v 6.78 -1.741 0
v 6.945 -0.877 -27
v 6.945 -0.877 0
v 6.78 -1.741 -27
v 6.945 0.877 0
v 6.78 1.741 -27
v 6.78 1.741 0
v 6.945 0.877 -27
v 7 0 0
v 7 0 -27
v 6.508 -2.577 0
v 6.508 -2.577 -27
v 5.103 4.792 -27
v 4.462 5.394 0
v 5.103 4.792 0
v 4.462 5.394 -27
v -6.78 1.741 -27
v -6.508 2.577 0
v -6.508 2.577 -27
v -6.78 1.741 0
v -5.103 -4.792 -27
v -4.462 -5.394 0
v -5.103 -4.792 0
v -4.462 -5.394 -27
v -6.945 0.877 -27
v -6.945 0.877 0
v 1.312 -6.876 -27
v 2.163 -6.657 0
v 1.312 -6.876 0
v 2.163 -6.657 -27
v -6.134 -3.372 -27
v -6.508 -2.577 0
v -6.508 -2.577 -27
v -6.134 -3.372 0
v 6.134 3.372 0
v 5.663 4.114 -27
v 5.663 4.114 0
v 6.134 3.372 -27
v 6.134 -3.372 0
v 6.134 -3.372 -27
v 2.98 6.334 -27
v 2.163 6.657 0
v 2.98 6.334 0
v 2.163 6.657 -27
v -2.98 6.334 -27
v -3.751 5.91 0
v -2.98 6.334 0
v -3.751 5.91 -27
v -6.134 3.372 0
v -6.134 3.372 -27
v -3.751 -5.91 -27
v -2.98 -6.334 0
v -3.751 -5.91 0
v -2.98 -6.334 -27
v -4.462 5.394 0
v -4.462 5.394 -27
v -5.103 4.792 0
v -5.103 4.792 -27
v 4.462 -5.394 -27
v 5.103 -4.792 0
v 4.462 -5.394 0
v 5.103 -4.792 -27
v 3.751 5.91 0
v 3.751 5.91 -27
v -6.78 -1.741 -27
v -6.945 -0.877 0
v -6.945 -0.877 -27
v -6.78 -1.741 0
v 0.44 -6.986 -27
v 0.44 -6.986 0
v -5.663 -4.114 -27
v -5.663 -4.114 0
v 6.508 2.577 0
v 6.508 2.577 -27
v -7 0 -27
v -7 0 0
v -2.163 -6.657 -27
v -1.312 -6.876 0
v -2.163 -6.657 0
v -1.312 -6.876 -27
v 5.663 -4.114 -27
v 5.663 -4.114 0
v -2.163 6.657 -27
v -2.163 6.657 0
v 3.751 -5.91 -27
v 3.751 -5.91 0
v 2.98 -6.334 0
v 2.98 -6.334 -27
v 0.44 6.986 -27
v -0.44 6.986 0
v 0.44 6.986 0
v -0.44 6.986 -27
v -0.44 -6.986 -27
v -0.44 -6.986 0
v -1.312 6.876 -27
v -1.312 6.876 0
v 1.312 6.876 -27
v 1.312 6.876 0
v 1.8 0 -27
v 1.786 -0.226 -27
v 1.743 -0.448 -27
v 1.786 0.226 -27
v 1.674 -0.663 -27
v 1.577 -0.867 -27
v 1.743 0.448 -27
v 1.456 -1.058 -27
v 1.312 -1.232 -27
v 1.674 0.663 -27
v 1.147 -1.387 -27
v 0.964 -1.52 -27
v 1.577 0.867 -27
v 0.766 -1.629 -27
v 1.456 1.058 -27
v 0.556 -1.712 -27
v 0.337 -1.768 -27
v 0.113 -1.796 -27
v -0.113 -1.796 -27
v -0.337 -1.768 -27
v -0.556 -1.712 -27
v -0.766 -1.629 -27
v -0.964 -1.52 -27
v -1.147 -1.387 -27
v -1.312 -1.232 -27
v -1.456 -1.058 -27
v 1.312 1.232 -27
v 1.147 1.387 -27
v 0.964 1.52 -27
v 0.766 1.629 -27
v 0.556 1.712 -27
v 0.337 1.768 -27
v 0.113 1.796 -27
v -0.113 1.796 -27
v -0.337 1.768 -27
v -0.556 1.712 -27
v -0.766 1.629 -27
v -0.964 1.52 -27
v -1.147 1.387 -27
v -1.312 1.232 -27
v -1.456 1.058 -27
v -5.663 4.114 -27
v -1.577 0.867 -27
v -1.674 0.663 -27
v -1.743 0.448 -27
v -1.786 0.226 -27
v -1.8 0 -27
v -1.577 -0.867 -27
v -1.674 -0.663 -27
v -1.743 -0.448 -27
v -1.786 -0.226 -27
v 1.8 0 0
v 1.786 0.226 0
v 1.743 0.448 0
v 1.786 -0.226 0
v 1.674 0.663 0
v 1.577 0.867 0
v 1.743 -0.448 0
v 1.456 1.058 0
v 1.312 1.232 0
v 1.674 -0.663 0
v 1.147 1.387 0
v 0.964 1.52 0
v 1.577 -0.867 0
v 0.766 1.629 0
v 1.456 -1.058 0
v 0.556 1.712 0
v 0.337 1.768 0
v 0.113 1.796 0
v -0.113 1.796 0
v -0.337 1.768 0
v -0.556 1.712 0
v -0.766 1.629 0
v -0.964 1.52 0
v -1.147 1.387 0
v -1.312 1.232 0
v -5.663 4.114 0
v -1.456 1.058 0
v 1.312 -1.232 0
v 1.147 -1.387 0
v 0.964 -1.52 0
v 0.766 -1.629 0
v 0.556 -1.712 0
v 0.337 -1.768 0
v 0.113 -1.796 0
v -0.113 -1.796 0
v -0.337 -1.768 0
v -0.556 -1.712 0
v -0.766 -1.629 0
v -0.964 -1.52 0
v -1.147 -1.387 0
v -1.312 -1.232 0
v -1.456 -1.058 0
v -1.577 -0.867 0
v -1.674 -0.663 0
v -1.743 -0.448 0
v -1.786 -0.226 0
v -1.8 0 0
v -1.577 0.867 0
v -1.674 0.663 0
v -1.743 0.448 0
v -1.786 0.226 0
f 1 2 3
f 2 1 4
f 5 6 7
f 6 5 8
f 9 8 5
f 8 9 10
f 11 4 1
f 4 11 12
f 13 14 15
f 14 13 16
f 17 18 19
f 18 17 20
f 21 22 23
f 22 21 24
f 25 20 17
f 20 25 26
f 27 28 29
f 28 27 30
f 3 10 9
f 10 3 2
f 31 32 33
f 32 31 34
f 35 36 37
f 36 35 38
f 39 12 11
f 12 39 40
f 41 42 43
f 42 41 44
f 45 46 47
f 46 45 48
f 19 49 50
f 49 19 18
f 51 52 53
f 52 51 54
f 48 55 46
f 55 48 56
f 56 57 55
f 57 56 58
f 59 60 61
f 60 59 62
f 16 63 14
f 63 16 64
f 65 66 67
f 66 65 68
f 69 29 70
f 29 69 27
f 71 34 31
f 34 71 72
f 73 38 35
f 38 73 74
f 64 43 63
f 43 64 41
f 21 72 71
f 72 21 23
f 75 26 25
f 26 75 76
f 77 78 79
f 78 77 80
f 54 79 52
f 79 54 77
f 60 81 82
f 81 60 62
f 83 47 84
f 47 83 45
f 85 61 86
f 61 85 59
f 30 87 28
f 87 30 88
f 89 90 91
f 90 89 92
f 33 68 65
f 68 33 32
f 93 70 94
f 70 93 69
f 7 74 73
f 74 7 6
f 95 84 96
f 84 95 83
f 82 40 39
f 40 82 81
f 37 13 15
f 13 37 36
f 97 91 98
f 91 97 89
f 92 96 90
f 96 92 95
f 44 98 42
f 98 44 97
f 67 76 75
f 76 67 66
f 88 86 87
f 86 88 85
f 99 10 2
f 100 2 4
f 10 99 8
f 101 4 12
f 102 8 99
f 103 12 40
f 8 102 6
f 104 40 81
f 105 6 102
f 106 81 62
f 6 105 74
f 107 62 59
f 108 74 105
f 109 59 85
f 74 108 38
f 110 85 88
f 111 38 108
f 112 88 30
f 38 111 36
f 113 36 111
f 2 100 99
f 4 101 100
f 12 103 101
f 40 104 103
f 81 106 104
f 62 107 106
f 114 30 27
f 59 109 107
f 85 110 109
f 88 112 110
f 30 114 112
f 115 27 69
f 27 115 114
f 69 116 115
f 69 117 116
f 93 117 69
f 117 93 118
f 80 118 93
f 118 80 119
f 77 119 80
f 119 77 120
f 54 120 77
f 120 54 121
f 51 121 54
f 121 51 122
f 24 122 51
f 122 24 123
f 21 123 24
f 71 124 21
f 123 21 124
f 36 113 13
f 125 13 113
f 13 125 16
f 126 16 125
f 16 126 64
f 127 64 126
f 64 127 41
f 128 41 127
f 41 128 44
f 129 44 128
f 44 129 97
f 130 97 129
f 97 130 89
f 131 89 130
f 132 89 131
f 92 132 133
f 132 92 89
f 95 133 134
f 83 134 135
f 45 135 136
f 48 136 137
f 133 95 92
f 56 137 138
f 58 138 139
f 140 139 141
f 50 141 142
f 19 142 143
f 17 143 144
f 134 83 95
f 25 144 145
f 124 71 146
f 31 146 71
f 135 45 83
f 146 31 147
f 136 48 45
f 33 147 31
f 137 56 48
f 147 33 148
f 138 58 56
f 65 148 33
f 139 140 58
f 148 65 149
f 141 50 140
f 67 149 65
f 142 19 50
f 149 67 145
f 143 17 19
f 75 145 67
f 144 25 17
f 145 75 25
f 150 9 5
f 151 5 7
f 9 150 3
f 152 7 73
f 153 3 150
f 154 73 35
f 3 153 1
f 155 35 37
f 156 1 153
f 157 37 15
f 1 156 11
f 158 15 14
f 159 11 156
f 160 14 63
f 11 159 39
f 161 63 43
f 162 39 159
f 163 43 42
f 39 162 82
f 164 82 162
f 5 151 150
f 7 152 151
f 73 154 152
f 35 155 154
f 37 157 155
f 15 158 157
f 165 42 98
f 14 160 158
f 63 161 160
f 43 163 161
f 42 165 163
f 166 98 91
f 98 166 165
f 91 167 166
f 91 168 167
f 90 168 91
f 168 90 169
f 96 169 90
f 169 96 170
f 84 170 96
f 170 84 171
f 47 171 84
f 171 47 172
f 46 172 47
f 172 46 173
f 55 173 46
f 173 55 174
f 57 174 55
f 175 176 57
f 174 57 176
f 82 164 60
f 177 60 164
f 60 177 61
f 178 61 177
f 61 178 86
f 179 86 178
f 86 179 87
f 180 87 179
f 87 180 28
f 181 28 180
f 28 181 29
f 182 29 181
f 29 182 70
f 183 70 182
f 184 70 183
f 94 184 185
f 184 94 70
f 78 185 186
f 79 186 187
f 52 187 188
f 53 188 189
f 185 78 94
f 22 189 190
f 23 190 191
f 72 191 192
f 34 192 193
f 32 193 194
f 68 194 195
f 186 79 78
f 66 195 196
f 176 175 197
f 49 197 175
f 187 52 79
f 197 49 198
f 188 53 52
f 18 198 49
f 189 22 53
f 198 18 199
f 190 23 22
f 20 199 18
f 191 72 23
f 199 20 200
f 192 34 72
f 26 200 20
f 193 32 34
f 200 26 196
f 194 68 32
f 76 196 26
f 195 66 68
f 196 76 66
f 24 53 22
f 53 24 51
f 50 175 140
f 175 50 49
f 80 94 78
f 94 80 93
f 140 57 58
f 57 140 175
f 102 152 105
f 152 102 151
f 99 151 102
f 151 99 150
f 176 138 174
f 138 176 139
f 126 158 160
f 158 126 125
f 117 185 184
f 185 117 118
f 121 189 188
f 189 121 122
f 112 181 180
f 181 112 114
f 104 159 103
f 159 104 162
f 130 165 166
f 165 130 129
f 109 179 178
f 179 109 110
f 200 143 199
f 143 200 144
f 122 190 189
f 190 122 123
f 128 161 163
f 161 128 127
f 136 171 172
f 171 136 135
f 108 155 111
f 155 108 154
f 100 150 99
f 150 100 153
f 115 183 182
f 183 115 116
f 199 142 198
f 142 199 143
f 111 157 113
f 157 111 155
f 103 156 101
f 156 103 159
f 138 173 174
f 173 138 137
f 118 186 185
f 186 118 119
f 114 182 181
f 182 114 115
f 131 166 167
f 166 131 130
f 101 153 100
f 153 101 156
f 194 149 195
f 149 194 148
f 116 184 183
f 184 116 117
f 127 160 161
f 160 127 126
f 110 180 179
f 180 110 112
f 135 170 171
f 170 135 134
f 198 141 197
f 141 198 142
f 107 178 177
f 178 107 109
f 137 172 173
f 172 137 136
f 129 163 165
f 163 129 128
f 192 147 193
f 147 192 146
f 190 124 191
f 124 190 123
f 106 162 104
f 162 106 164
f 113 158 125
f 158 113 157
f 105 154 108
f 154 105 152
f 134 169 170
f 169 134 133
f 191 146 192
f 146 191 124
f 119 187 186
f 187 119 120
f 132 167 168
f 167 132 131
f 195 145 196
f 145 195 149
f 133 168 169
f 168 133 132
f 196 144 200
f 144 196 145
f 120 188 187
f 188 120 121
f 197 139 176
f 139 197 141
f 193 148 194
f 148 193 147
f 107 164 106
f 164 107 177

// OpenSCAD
$fn = 50;


difference() {
	union() {
		translate(v = [0, 0, -27.0000000000]) {
			cylinder(h = 27, r = 7.0000000000);
		}
		cylinder(h = 0, r = 13.0000000000);
	}
	union() {
		#translate(v = [0, 0, -27]) {
			cylinder(h = 27, r = 1.8000000000);
		}
	}
}
